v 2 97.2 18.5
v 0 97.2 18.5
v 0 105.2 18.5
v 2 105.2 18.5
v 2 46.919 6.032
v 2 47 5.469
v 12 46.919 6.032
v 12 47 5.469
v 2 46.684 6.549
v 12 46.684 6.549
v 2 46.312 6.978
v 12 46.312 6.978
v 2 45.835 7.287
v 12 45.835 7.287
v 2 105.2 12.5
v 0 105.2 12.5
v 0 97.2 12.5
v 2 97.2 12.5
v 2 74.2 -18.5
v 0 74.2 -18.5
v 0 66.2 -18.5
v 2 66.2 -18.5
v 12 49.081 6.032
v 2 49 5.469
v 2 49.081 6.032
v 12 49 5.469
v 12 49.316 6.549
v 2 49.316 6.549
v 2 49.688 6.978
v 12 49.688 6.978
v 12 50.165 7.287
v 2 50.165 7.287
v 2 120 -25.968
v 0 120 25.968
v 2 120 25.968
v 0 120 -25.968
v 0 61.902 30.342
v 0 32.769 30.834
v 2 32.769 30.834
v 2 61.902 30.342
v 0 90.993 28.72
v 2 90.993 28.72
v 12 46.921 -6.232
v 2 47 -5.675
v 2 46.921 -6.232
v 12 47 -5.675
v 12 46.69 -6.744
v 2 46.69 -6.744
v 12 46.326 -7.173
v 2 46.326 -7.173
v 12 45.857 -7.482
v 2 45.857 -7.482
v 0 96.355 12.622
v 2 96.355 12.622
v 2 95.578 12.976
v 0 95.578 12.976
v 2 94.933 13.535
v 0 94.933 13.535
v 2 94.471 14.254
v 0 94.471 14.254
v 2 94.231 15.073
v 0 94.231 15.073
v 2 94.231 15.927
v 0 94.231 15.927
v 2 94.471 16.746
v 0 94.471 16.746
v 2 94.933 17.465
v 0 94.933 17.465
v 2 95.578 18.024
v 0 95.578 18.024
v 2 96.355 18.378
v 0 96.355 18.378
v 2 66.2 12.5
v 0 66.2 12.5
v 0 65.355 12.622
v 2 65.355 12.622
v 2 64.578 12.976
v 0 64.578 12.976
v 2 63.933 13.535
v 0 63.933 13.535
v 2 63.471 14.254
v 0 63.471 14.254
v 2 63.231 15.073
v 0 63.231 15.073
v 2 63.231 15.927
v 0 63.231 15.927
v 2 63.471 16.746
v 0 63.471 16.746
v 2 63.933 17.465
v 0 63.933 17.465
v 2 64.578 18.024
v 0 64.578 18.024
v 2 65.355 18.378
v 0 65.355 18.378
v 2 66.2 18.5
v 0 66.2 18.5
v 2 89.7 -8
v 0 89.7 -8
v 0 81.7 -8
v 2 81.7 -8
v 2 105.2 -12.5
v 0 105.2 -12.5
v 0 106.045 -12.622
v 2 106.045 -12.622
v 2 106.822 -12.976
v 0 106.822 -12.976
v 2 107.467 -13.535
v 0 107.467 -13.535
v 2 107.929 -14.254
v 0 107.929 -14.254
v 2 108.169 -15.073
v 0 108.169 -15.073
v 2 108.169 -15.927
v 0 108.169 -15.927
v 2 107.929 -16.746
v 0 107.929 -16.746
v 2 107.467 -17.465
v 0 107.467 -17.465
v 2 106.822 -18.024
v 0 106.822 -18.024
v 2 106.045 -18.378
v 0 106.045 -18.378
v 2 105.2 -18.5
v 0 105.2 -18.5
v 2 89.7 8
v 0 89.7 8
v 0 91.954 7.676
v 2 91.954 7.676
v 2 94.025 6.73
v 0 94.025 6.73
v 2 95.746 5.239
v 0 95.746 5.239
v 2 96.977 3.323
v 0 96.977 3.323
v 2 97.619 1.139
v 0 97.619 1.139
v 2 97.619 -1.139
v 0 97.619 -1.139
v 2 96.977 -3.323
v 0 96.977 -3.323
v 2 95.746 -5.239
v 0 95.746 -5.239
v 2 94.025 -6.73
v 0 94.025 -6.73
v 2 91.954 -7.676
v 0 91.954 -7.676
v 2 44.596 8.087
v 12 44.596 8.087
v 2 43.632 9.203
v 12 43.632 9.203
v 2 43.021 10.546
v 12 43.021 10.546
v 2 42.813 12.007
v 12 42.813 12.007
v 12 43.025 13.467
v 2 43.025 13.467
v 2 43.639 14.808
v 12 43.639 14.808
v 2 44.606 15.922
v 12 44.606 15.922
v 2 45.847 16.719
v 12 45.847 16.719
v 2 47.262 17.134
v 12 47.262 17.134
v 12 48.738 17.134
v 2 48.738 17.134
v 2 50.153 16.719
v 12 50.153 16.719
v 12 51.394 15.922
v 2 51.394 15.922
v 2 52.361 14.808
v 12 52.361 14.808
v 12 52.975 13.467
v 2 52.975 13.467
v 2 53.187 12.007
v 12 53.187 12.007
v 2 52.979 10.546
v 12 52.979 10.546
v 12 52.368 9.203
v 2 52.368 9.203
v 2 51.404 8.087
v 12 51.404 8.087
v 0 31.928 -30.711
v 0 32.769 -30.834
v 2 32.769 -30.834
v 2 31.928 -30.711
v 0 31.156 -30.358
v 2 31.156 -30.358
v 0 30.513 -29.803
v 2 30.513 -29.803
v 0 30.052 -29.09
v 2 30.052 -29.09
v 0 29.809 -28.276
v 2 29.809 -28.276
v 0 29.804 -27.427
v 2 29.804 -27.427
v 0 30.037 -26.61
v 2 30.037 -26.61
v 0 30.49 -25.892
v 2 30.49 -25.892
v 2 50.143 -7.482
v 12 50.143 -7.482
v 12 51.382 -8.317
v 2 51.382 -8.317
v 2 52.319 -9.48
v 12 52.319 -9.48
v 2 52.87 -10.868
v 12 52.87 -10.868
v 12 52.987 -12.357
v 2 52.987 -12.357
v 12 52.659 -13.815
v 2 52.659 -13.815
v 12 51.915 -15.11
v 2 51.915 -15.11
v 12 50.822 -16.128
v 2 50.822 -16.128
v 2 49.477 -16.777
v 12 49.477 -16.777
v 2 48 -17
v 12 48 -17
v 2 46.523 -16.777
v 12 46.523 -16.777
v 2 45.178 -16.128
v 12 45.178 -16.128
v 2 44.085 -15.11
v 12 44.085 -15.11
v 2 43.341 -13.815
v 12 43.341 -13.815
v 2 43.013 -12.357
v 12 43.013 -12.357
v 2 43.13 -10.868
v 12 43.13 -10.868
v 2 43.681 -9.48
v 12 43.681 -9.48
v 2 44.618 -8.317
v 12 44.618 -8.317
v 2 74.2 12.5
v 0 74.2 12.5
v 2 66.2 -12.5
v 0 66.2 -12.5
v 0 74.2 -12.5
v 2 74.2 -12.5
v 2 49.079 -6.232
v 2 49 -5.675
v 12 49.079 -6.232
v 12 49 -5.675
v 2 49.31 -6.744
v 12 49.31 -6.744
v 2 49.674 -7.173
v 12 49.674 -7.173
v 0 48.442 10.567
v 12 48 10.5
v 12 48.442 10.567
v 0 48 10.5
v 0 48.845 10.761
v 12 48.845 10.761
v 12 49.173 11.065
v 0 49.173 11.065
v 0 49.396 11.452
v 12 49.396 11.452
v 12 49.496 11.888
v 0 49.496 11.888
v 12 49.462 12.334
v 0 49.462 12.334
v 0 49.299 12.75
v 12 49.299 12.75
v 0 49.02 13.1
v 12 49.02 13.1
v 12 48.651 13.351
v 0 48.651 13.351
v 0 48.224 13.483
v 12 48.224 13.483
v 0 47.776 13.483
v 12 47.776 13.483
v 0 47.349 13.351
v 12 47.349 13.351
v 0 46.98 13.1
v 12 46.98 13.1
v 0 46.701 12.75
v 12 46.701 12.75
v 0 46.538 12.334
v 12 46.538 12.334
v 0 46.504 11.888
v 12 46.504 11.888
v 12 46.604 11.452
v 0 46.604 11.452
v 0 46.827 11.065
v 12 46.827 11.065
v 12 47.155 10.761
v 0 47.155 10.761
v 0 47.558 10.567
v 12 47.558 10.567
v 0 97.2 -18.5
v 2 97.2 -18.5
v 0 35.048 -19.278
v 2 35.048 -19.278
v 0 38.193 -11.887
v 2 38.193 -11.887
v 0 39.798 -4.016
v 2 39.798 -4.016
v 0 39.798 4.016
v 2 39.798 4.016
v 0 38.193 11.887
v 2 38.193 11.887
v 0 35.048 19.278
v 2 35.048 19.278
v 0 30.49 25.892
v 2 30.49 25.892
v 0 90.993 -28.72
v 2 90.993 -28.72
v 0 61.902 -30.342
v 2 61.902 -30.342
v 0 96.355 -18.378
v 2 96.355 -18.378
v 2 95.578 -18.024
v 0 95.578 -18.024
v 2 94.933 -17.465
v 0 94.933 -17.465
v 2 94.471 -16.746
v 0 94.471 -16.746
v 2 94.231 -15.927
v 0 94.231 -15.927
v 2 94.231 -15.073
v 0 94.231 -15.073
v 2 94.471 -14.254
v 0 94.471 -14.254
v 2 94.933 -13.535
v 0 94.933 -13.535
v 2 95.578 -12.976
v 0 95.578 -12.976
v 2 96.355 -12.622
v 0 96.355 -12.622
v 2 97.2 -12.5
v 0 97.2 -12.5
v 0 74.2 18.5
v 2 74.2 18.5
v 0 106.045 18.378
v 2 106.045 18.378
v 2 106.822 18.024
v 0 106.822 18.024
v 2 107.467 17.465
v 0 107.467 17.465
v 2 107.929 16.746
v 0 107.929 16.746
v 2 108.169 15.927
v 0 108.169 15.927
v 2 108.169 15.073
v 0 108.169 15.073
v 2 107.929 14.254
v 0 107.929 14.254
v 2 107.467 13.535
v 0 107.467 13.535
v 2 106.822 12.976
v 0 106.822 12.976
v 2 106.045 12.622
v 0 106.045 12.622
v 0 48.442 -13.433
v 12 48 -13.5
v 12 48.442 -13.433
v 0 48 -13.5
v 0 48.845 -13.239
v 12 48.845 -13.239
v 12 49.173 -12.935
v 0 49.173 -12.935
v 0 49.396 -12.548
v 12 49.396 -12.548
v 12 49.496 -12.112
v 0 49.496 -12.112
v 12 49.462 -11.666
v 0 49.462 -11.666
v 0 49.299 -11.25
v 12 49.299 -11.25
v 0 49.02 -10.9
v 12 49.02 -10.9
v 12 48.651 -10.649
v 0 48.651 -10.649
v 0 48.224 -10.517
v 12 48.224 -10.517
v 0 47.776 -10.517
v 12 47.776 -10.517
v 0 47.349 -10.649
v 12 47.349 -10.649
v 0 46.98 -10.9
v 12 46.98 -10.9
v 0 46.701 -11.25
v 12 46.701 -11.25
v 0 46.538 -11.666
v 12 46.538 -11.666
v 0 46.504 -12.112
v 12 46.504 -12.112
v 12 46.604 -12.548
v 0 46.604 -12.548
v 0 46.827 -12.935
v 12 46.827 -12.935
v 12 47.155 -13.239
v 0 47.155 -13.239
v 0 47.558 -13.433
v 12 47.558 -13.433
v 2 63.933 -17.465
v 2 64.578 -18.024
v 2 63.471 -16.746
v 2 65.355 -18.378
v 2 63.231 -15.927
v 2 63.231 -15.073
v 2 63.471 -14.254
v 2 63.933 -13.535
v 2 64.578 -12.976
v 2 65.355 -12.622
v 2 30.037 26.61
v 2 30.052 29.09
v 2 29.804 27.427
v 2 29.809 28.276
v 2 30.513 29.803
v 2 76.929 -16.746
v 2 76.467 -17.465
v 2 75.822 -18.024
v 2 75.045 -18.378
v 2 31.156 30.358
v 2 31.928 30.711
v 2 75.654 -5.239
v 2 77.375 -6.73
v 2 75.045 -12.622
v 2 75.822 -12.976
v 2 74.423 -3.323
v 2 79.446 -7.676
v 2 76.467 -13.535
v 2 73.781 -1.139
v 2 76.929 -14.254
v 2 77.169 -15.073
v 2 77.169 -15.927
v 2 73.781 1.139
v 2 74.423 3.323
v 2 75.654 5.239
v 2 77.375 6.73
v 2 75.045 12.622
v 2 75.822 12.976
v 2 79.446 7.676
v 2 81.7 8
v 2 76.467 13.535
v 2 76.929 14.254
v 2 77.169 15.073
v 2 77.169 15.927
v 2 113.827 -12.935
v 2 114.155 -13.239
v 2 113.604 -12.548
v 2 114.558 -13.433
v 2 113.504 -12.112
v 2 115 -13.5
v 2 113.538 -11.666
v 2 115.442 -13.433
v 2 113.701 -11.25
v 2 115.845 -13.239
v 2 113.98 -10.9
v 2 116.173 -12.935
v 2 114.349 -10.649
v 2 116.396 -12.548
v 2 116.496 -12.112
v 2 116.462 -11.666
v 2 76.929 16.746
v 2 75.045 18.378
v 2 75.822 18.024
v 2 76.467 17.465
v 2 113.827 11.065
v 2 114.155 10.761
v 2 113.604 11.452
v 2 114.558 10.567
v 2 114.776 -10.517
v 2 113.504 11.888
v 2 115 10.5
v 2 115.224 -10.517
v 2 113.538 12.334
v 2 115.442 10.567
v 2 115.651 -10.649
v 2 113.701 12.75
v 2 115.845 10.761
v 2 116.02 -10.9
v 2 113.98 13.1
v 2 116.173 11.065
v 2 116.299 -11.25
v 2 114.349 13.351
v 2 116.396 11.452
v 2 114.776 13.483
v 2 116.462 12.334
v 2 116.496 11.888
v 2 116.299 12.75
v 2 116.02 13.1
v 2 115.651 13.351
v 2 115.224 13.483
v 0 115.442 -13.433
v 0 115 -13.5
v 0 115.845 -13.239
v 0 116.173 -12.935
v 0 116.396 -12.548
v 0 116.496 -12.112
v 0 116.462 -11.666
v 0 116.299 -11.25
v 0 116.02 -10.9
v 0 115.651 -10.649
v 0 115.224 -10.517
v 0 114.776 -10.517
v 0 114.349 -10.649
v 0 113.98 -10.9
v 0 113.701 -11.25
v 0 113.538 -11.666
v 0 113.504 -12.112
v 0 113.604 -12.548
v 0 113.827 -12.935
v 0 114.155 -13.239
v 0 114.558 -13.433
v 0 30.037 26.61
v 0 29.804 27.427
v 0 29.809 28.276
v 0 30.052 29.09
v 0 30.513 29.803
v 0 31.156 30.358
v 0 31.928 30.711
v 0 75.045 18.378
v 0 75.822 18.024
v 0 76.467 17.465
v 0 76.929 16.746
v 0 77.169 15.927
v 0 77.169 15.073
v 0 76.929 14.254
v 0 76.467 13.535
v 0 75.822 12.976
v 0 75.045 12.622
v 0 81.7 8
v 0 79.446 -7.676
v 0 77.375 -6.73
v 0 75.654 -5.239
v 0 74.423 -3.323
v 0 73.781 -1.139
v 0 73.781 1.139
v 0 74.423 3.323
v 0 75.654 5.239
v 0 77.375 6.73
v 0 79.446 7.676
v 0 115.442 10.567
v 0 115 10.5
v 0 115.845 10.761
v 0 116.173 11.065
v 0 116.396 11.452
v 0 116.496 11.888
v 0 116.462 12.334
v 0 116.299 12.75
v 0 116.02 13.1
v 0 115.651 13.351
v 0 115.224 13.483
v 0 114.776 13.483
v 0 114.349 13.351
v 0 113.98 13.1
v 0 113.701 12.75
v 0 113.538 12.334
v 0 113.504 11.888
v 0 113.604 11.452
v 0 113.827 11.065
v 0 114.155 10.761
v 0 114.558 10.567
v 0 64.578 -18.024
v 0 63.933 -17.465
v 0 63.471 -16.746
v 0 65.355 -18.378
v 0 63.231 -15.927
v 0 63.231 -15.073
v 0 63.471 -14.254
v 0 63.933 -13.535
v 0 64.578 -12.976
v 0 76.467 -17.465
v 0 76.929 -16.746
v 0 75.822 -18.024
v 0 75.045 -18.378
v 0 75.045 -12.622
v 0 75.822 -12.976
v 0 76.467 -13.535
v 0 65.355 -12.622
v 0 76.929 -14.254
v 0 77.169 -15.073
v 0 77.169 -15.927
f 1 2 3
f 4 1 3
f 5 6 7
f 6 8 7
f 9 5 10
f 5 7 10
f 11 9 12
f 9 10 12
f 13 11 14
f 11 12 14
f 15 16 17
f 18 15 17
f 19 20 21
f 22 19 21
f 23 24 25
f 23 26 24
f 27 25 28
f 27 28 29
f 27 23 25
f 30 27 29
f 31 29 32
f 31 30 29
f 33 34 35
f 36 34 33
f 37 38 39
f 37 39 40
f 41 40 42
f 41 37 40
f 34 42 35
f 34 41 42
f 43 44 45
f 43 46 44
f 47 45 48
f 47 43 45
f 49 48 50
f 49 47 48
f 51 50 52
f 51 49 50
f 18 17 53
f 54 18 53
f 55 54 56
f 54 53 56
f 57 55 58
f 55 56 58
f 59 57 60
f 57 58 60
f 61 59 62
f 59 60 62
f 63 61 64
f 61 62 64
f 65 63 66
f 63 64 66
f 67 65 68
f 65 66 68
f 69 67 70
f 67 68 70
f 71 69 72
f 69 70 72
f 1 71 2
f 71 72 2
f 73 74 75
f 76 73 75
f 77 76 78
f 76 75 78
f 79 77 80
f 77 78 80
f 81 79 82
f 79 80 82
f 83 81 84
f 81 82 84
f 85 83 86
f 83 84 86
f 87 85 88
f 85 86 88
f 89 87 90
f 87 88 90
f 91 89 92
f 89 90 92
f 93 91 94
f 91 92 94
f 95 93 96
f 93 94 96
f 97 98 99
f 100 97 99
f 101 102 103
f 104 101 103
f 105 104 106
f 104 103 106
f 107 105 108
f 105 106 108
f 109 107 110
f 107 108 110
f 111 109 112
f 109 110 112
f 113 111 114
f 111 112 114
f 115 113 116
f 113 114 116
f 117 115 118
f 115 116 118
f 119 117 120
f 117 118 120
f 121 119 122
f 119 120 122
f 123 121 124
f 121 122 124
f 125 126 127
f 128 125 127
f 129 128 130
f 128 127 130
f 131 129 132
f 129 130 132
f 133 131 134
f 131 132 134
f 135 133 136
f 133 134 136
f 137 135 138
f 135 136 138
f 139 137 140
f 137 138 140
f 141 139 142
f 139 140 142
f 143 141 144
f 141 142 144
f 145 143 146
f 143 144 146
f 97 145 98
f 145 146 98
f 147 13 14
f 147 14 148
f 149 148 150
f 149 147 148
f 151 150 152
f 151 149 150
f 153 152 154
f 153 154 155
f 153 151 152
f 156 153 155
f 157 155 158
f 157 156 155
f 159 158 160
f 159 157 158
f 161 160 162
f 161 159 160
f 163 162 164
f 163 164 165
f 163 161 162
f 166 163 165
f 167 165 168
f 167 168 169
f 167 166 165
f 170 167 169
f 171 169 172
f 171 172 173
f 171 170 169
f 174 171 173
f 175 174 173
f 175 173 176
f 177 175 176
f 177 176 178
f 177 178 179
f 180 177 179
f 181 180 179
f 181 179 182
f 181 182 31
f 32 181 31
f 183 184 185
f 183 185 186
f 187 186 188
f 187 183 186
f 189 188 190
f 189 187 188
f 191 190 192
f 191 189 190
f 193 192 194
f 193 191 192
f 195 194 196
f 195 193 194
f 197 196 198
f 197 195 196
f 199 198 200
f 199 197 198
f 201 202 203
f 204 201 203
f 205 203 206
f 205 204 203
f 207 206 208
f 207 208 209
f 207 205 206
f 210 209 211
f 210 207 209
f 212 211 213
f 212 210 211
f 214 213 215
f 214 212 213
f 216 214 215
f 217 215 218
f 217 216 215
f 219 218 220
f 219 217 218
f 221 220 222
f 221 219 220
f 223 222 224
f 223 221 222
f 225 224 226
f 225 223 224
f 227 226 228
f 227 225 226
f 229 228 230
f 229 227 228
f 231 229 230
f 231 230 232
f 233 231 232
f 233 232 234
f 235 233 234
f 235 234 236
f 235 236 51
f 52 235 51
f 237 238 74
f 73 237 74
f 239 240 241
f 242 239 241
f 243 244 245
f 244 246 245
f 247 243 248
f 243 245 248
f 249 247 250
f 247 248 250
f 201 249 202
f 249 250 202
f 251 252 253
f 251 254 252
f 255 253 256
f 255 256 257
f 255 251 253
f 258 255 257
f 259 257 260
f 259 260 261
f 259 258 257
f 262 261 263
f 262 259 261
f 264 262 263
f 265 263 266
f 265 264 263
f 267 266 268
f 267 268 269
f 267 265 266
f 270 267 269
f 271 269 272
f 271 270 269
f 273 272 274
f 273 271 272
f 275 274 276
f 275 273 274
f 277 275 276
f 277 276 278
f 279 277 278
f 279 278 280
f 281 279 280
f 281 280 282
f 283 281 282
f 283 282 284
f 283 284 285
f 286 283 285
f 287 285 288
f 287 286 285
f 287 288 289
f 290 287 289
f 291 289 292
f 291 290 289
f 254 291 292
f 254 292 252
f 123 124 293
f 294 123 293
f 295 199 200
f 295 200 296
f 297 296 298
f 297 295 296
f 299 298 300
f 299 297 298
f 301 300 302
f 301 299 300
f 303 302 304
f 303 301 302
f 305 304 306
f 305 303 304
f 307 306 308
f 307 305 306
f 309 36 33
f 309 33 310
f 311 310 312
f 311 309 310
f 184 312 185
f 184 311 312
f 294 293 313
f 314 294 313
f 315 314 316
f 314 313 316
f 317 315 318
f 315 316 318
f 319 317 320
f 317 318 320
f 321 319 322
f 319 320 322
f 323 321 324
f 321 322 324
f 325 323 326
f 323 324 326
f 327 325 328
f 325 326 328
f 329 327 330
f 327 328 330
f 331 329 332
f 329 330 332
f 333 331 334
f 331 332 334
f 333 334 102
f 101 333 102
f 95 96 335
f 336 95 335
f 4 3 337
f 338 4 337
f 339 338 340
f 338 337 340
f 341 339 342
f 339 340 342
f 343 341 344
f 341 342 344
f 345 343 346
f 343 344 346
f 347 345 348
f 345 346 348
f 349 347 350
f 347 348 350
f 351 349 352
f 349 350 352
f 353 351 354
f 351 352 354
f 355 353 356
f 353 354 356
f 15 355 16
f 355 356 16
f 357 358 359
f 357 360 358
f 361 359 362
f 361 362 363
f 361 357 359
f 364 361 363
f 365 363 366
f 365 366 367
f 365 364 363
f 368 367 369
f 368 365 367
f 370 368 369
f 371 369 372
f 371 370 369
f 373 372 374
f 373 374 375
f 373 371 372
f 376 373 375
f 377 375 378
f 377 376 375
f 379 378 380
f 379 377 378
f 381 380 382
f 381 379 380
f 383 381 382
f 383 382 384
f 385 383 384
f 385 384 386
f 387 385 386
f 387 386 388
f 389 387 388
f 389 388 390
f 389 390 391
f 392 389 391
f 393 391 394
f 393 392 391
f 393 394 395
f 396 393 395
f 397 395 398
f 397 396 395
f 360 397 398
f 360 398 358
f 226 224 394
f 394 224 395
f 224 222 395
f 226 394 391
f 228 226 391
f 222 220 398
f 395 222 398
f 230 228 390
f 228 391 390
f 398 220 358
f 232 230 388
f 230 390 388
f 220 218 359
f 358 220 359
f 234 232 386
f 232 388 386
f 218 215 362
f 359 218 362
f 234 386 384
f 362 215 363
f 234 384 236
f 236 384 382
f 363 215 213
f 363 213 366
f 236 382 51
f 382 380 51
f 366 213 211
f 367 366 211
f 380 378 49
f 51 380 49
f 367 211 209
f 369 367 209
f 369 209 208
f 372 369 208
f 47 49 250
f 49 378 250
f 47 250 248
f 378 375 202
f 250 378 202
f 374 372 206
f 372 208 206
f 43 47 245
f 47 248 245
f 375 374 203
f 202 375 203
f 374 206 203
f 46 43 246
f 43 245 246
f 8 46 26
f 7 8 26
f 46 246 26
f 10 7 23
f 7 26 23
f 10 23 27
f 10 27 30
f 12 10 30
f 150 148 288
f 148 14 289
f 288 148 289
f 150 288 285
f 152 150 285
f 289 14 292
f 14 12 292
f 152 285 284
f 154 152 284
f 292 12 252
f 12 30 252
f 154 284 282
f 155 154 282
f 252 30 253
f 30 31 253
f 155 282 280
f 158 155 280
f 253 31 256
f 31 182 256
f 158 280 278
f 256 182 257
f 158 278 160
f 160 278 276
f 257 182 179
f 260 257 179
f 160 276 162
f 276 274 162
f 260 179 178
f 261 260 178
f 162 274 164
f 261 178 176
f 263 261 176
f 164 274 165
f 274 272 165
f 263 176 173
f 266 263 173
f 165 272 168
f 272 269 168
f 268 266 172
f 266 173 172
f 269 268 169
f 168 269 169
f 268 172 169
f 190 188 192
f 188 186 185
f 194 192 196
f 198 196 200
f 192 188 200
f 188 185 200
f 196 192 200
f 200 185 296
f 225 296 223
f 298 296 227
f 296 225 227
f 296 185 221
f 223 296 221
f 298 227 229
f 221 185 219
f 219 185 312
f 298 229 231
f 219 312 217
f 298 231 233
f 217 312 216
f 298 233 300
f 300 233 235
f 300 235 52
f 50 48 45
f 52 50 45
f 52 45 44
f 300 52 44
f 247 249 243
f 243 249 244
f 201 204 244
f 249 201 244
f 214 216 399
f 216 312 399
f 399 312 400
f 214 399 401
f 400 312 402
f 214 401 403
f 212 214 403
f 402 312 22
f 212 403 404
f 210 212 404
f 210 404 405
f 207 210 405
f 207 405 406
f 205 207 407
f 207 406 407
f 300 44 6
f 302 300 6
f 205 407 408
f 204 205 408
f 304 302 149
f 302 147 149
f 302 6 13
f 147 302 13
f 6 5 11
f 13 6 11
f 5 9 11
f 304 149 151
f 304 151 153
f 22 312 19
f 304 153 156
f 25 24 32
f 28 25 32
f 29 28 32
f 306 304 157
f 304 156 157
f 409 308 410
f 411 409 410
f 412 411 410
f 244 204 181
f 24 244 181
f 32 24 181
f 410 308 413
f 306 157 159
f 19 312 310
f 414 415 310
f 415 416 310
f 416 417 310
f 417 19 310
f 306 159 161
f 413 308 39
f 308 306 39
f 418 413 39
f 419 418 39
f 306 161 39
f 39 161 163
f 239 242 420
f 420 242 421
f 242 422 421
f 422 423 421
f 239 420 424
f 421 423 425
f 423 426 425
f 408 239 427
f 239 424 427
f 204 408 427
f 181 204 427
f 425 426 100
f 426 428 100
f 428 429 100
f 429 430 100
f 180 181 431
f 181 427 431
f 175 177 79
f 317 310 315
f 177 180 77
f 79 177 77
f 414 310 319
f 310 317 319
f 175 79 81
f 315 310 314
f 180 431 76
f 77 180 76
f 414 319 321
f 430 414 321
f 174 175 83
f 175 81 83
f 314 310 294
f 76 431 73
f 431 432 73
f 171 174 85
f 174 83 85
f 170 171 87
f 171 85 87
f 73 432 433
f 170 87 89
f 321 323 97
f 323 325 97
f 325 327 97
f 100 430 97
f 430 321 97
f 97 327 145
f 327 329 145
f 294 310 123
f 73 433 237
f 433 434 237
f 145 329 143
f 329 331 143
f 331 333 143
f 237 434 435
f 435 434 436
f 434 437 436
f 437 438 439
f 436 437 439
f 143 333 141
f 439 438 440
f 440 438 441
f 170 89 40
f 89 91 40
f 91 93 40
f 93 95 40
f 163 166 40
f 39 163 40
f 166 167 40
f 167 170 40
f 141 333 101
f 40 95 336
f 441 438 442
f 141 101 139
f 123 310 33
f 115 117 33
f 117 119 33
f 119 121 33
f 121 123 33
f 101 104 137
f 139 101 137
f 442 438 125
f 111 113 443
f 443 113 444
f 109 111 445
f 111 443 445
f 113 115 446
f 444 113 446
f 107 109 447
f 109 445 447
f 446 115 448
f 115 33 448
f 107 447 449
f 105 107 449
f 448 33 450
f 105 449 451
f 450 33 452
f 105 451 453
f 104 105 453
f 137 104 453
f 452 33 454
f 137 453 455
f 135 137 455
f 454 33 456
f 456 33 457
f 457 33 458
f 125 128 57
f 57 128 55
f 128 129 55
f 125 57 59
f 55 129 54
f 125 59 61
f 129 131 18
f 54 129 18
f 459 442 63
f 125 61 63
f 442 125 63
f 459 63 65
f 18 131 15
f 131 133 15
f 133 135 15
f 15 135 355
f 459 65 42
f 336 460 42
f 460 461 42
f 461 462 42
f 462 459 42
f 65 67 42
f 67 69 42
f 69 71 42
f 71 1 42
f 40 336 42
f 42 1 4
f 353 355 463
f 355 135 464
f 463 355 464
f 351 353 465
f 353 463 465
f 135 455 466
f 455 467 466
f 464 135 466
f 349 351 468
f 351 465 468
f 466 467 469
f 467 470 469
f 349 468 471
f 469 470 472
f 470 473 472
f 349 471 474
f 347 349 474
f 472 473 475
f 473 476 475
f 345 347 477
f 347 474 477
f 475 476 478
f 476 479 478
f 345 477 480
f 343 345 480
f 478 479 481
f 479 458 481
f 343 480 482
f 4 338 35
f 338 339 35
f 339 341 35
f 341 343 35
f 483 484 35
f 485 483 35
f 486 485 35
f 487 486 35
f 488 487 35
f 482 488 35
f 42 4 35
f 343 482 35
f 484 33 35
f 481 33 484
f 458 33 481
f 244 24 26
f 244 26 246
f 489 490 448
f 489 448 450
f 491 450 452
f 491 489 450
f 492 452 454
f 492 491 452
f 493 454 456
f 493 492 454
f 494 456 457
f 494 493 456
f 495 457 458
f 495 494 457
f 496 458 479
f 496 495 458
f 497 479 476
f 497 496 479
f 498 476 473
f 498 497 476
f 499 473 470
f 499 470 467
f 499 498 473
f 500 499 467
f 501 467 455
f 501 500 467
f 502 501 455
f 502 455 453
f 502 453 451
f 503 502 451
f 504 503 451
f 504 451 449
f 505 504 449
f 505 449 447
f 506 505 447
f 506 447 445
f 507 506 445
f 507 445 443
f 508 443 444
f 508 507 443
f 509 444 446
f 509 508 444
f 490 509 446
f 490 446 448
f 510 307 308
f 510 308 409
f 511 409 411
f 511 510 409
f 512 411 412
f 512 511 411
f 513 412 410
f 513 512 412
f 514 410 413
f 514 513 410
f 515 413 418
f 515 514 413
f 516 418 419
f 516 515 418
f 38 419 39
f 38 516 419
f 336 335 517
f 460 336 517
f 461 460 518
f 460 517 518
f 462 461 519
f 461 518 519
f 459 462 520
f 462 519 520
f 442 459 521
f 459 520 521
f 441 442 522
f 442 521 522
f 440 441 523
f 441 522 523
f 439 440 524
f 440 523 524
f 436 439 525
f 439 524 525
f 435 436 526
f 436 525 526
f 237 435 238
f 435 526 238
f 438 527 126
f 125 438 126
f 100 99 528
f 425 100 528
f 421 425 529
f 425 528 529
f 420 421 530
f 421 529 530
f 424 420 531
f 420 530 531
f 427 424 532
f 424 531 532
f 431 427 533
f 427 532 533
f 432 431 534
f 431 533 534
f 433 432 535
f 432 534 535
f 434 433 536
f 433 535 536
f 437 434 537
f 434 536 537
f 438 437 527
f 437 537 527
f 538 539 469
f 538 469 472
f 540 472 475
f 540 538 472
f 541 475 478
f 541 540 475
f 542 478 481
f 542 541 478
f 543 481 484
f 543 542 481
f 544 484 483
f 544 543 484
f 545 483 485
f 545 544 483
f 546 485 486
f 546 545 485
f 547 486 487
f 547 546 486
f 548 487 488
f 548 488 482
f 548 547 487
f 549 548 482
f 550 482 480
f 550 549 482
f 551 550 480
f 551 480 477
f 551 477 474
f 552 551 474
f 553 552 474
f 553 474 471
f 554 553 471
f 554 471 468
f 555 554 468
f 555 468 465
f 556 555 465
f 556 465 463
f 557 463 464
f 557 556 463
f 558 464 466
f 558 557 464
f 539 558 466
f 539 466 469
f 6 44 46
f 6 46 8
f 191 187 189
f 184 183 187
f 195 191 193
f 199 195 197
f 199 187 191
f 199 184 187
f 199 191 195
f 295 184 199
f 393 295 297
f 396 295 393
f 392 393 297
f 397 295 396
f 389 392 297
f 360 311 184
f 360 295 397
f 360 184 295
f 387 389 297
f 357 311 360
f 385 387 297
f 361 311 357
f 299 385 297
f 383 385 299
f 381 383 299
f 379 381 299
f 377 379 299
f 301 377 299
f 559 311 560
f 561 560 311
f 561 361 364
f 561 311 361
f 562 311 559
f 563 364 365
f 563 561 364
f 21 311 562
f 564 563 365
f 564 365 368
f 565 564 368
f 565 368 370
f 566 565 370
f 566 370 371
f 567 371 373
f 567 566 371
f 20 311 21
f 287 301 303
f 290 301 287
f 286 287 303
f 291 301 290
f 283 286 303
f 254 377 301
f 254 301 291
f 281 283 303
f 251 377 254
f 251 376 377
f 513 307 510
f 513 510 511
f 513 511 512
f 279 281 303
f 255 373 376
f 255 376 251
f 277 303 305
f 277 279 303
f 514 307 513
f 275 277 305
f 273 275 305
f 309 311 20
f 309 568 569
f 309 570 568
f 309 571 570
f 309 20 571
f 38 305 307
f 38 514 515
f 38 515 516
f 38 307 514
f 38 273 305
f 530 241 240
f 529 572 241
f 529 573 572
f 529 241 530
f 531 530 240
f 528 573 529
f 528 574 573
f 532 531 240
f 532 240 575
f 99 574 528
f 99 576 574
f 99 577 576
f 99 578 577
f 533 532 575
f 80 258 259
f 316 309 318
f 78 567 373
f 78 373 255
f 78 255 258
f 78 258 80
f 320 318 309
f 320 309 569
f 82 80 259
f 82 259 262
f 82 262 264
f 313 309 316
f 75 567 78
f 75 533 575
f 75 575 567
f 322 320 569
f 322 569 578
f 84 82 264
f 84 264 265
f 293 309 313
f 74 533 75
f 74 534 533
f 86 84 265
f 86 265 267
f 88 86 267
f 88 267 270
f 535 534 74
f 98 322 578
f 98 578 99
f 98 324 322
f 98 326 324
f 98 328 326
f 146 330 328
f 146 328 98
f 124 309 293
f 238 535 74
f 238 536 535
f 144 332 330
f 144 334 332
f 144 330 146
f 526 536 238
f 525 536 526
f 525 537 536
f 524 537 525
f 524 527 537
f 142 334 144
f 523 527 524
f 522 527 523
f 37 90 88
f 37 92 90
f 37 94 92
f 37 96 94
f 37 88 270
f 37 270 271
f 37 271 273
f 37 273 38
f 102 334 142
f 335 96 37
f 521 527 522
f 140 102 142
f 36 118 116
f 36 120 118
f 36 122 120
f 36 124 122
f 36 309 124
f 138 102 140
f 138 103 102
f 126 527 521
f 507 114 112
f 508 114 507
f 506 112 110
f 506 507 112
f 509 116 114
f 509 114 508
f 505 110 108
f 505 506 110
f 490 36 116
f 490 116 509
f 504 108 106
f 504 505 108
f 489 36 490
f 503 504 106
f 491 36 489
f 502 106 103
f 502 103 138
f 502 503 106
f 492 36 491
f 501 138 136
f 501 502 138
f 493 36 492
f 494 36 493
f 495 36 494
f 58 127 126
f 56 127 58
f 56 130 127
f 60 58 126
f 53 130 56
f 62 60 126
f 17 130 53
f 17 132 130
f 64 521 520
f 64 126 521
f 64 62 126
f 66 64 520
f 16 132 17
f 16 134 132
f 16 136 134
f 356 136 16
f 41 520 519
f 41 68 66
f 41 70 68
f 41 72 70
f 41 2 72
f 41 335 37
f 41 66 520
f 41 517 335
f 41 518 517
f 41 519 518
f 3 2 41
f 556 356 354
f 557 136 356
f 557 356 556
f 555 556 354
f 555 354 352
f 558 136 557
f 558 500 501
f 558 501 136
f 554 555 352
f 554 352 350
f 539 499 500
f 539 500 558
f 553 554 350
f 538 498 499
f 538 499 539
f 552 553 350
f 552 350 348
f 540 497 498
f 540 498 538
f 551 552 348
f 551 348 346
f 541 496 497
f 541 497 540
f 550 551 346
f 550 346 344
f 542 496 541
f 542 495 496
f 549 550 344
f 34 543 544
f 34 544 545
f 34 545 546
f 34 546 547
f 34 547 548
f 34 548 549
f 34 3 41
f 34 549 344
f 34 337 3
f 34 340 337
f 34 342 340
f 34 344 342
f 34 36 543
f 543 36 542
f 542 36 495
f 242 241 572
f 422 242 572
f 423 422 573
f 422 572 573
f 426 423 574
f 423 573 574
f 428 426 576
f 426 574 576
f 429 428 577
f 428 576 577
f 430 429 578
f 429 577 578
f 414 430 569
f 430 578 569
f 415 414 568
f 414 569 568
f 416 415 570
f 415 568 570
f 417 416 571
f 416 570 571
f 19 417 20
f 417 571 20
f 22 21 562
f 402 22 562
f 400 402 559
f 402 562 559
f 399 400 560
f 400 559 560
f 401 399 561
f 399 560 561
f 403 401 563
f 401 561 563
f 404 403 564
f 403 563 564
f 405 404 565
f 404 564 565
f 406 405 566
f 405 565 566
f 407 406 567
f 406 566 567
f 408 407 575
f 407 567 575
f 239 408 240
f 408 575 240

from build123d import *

# Parameters (mm, degrees)
SKETCH1_R           = 1.5
BOSS_EXTRUDE1_DEPTH = 2
SKETCH2_R           = 1.5
BOSS_EXTRUDE2_DEPTH = 10
FILLET1_R           = 2


with BuildPart() as part:
    # Sketch1 → Boss-Extrude1 (new body)
    with BuildSketch(Plane(origin=(0, 0, 0), x_dir=(0, 0, -1), z_dir=(1, 0, 0))):
        with BuildLine():
            Line((-25.968110327, 120), (25.968110327, 120))
            ThreePointArc((25.968110327, 120), (29.67212348, 76.455251784), (30.833602138, 32.768688884))
            ThreePointArc((30.833602138, 32.768688884), (29.089961469, 30.052105348), (25.891732052, 30.48964105))
            ThreePointArc((25.891732052, 30.48964105), (0, 40), (-25.891732052, 30.48964105))
            ThreePointArc((-25.891732052, 30.48964105), (-29.089961469, 30.052105348), (-30.833602138, 32.768688884))
            ThreePointArc((-30.833602138, 32.768688884), (-29.67212348, 76.455251784), (-25.968110327, 120))
        make_face()
        with Locations((-12, 115)):
            Circle(SKETCH1_R, mode=Mode.SUBTRACT)
        with Locations((12, 115)):
            Circle(SKETCH1_R, mode=Mode.SUBTRACT)
        with Locations((-12, 48)):
            Circle(SKETCH1_R, mode=Mode.SUBTRACT)
        with Locations((12, 48)):
            Circle(SKETCH1_R, mode=Mode.SUBTRACT)
        with BuildLine():
            Line((8, 89.7), (8, 81.7))
            ThreePointArc((8, 81.7), (0, 73.7), (-8, 81.7))
            Line((-8, 81.7), (-8, 89.7))
            ThreePointArc((-8, 89.7), (0, 97.7), (8, 89.7))
        make_face(mode=Mode.SUBTRACT)
        with BuildLine():
            Line((18.5, 105.2), (18.5, 97.2))
            ThreePointArc((18.5, 97.2), (15.5, 94.2), (12.5, 97.2))
            Line((12.5, 97.2), (12.5, 105.2))
            ThreePointArc((12.5, 105.2), (15.5, 108.2), (18.5, 105.2))
        make_face(mode=Mode.SUBTRACT)
        with BuildLine():
            Line((18.5, 74.2), (18.5, 66.2))
            ThreePointArc((18.5, 66.2), (15.5, 63.2), (12.5, 66.2))
            Line((12.5, 66.2), (12.5, 74.2))
            ThreePointArc((12.5, 74.2), (15.5, 77.2), (18.5, 74.2))
        make_face(mode=Mode.SUBTRACT)
        with BuildLine():
            Line((-12.5, 105.2), (-12.5, 97.2))
            ThreePointArc((-12.5, 97.2), (-15.5, 94.2), (-18.5, 97.2))
            Line((-18.5, 97.2), (-18.5, 105.2))
            ThreePointArc((-18.5, 105.2), (-15.5, 108.2), (-12.5, 105.2))
        make_face(mode=Mode.SUBTRACT)
        with BuildLine():
            Line((-12.5, 74.2), (-12.5, 66.2))
            ThreePointArc((-12.5, 66.2), (-15.5, 63.2), (-18.5, 66.2))
            Line((-18.5, 66.2), (-18.5, 74.2))
            ThreePointArc((-18.5, 74.2), (-15.5, 77.2), (-12.5, 74.2))
        make_face(mode=Mode.SUBTRACT)
    extrude(amount=BOSS_EXTRUDE1_DEPTH)

    # Sketch2 → Boss-Extrude2 (add)
    with BuildSketch(Plane(origin=(2, 0, 0), x_dir=(0, 0, -1), z_dir=(1, 0, 0))):
        with BuildLine():
            Line((-6.910390688, 49), (7.101020514, 49))
            ThreePointArc((7.101020514, 49), (17, 48), (7.101020514, 47))
            Line((7.101020514, 47), (-6.910390688, 47))
            ThreePointArc((-6.910390688, 47), (-17.186918444, 48), (-6.910390688, 49))
        make_face()
        with Locations((-12, 48)):
            Circle(SKETCH2_R, mode=Mode.SUBTRACT)
        with Locations((12, 48)):
            Circle(SKETCH2_R, mode=Mode.SUBTRACT)
    extrude(amount=BOSS_EXTRUDE2_DEPTH)

    # Fillet1
    fillet1_edges = [part.edges().sort_by_distance(p)[0] for p in [
        (7, 49, 6.910390688),
        (7, 47, 6.910390688),
        (7, 47, -7.101020514),
        (7, 49, -7.101020514),
    ]]
    fillet(fillet1_edges, radius=FILLET1_R)


solid = part.part
